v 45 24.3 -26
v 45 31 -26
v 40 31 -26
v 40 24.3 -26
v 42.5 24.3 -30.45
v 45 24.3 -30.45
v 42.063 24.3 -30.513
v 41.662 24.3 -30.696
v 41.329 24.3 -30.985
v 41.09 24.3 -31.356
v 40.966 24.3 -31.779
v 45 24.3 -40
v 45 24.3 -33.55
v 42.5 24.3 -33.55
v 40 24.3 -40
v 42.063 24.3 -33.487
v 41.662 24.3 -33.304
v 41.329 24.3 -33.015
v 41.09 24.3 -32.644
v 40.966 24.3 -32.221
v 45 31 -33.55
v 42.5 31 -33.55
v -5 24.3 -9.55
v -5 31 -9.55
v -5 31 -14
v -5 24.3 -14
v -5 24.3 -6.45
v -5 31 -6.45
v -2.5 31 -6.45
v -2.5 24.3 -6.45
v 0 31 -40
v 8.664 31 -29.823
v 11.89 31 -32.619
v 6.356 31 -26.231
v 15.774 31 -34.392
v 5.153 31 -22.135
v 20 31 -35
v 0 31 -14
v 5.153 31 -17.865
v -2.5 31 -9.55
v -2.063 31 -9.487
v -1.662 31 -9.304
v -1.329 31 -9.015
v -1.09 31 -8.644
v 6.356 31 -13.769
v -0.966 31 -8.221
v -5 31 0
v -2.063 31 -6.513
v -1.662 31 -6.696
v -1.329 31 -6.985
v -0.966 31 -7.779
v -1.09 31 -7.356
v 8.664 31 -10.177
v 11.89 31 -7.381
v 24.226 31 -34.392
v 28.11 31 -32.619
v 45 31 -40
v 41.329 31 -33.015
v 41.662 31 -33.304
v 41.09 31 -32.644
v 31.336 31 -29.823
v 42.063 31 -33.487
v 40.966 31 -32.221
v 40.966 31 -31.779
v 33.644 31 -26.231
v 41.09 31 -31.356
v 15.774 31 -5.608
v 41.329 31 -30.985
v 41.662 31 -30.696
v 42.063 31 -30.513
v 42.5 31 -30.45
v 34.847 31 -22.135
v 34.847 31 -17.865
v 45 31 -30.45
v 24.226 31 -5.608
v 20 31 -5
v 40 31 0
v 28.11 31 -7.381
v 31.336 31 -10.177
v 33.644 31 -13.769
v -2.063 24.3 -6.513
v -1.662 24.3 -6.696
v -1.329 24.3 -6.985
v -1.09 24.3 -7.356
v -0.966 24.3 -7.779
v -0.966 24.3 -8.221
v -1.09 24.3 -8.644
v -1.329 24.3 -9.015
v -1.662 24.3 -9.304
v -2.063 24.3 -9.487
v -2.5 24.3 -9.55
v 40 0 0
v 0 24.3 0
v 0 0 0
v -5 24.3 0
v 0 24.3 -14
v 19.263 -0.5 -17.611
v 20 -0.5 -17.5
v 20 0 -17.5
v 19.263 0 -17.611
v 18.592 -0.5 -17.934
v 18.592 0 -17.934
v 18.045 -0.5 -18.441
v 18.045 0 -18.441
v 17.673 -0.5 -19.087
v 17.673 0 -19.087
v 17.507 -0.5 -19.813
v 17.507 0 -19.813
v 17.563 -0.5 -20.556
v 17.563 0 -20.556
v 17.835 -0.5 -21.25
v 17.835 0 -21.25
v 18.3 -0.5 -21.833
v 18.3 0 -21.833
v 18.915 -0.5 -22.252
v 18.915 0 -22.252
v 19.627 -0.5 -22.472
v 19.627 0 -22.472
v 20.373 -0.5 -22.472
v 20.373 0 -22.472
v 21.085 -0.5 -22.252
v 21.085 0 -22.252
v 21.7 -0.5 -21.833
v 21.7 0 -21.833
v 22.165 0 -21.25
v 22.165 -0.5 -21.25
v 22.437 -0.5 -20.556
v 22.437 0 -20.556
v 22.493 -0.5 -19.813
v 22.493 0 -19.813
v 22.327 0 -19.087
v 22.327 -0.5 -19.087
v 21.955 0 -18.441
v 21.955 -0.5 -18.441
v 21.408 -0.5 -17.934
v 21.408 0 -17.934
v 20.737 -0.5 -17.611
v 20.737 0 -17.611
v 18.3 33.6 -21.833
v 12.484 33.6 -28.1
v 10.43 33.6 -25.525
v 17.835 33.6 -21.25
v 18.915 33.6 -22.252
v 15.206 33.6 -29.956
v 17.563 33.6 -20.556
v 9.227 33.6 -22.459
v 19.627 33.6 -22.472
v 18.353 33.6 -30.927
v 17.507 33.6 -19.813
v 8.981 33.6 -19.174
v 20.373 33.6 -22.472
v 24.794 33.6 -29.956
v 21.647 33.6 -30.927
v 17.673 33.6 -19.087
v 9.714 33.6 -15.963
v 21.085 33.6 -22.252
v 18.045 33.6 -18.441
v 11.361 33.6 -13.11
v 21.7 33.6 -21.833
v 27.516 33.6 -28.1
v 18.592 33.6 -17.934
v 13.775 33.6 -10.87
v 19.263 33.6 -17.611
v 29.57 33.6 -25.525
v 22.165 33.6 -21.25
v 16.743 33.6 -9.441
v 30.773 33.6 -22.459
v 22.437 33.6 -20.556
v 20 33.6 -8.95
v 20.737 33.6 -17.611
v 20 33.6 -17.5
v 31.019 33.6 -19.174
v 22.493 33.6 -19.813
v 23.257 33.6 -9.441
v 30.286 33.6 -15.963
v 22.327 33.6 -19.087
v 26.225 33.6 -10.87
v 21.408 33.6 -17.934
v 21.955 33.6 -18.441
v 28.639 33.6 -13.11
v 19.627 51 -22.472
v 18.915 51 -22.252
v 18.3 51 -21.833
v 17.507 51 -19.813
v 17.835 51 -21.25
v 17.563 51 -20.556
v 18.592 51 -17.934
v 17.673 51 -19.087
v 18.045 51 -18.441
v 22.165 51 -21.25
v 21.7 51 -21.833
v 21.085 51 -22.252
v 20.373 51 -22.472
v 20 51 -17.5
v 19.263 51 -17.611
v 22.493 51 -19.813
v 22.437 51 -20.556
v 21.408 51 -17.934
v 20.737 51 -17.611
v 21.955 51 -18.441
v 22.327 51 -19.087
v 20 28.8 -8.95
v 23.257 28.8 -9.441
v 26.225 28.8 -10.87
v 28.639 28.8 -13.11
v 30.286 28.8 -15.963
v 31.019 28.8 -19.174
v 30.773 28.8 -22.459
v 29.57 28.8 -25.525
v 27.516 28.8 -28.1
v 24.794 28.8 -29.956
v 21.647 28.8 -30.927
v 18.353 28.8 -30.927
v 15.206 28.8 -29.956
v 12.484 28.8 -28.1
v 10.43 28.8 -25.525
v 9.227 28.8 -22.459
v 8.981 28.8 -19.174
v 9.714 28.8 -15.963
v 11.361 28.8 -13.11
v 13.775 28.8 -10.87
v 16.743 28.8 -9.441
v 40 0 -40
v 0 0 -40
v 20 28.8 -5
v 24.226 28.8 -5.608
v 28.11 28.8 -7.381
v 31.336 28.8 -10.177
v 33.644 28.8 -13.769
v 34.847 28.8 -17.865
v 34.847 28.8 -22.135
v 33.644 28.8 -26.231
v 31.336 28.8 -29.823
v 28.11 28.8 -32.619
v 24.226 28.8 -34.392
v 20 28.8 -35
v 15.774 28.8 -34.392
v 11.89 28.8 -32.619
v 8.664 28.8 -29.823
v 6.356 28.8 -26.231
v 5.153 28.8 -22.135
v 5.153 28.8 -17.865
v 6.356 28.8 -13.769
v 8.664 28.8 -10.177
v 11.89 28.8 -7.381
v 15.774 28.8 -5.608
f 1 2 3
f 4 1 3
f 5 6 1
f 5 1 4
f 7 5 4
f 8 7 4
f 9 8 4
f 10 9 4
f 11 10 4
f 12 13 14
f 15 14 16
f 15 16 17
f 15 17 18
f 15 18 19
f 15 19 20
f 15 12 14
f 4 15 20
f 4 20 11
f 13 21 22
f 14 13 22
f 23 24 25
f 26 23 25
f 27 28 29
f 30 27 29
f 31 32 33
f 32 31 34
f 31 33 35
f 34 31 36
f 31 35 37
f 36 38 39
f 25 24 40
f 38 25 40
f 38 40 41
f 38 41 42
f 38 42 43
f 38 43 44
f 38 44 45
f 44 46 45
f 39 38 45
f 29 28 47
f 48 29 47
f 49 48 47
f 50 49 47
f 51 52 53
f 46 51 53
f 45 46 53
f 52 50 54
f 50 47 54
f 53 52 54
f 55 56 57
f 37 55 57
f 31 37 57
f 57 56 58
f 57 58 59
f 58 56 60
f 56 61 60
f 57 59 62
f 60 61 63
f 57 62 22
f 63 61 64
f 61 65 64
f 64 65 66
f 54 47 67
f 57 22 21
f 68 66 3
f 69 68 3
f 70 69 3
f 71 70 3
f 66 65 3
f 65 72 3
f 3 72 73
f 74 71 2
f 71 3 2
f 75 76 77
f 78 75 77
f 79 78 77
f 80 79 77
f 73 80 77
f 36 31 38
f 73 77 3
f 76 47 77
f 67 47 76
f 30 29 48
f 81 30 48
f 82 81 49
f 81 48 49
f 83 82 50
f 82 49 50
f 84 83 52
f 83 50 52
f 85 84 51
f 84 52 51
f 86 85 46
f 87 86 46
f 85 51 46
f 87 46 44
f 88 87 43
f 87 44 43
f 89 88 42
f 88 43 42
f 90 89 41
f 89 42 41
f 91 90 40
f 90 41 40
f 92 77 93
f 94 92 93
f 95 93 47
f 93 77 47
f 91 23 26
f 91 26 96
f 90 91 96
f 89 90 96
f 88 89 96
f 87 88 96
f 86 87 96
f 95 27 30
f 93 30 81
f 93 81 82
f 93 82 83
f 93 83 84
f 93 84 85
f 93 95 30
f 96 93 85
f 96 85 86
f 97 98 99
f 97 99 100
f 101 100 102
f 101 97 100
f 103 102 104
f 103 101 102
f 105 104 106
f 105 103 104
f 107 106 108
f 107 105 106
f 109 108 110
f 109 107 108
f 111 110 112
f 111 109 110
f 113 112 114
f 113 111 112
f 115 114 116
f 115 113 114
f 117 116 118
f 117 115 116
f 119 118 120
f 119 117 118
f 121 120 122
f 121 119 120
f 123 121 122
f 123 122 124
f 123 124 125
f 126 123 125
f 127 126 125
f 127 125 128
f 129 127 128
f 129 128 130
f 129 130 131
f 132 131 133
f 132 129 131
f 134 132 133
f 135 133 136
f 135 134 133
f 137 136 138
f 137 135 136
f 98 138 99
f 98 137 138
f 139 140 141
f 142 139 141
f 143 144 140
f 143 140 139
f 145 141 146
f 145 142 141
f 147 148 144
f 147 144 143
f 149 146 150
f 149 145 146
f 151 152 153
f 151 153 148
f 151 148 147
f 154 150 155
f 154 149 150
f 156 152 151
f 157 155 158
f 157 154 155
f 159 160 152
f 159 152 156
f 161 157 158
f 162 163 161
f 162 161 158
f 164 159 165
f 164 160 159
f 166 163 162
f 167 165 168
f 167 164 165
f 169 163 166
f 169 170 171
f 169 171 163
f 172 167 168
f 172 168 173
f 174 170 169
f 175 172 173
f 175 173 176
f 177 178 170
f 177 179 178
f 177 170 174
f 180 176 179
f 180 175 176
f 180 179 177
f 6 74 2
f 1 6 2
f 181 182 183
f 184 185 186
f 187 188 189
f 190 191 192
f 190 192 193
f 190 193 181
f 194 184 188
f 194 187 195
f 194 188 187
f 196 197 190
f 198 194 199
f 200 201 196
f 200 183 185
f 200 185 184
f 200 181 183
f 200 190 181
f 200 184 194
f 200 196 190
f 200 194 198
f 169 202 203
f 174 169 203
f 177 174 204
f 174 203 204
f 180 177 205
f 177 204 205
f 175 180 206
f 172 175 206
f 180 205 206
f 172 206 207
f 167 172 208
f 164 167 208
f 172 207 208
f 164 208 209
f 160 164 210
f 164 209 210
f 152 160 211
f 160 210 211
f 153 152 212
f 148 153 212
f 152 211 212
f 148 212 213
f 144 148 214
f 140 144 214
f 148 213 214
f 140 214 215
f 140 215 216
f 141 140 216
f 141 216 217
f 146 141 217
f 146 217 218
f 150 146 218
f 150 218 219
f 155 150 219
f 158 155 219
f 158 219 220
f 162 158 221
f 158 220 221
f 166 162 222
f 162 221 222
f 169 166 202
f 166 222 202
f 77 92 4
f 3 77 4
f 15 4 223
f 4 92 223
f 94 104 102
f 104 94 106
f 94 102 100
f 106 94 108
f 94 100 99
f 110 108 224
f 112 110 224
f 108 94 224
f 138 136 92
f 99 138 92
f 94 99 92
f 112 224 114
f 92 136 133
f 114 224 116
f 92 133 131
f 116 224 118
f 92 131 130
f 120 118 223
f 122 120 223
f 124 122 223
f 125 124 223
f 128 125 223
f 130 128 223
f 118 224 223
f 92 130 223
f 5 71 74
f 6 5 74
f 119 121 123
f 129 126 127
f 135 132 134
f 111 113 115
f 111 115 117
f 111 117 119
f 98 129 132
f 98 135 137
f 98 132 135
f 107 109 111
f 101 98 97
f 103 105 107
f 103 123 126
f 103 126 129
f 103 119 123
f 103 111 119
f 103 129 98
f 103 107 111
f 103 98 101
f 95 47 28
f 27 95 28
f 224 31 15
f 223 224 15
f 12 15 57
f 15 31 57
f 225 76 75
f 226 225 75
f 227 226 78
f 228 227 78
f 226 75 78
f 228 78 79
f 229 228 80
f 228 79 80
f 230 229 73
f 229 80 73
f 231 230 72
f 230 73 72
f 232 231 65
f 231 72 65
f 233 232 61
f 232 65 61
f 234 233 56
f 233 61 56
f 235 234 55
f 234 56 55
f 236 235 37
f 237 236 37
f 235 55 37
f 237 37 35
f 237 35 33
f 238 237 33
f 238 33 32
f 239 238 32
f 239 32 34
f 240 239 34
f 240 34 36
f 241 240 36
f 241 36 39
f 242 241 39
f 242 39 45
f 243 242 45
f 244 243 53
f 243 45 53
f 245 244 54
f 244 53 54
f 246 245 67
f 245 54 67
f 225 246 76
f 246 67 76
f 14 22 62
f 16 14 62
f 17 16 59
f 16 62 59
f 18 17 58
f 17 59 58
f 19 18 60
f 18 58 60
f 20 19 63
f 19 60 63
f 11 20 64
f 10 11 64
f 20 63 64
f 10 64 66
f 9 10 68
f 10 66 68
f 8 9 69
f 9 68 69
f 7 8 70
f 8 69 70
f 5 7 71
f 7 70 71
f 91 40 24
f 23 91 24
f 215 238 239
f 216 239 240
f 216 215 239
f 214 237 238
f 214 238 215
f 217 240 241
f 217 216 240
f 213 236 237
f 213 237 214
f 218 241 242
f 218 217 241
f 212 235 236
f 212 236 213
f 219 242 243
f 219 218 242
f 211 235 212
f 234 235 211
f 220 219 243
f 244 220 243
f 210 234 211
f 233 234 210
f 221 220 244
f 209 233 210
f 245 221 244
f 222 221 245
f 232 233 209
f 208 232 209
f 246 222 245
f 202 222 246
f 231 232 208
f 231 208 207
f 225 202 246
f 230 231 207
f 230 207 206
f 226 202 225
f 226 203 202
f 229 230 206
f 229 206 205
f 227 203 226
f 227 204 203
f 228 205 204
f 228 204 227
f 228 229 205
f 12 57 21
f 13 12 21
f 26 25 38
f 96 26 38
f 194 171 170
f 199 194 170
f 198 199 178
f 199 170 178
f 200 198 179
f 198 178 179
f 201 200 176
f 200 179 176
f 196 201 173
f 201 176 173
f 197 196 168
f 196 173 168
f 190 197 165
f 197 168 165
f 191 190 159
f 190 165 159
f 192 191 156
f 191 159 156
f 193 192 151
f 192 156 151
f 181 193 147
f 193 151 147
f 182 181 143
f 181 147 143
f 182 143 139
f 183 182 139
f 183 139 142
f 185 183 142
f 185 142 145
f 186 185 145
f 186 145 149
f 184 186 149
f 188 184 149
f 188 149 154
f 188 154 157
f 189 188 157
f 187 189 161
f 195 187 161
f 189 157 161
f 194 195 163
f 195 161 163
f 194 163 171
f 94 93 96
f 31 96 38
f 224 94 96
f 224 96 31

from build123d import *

# Parameters (mm, degrees)
SKETCH1_W           = 40
SKETCH1_H           = 40
BOSS_EXTRUDE1_DEPTH = 31
SKETCH2_R           = 15
CUT_EXTRUDE1_DEPTH  = 2.2
SKETCH3_R           = 11.05
BOSS_EXTRUDE2_DEPTH = 4.8
SKETCH4_R           = 2.5
BOSS_EXTRUDE3_DEPTH = 17.4
BOSS_EXTRUDE4_DEPTH = 6.7
CIRPATTERN1_COUNT   = 2
BOSS_EXTRUDE5_START = 0.5
SKETCH6_R           = 2.5
BOSS_EXTRUDE5_DEPTH = 0.5


with BuildPart() as part:
    # Sketch1 → Boss-Extrude1 (new body)
    with BuildSketch(Plane(origin=(0, 0, 0), x_dir=(1, 0, 0), z_dir=(0, 1, 0))):
        with Locations((20, 20)):
            Rectangle(SKETCH1_W, SKETCH1_H)
    extrude(amount=BOSS_EXTRUDE1_DEPTH)

    # Sketch2 → Cut-Extrude1 (cut)
    with BuildSketch(Plane(origin=(0, 31, 0), x_dir=(1, 0, 0), z_dir=(0, 1, 0))):
        with Locations((20, 20)):
            Circle(SKETCH2_R)
    extrude(amount=-CUT_EXTRUDE1_DEPTH, mode=Mode.SUBTRACT)

    # Sketch3 → Boss-Extrude2 (add)
    with BuildSketch(Plane(origin=(0, 28.8, 0), x_dir=(1, 0, 0), z_dir=(0, 1, 0))):
        with Locations((20, 20)):
            Circle(SKETCH3_R)
    extrude(amount=BOSS_EXTRUDE2_DEPTH)

    # Sketch4 → Boss-Extrude3 (add)
    with BuildSketch(Plane(origin=(0, 33.6, 0), x_dir=(1, 0, 0), z_dir=(0, 1, 0))):
        with Locations((20, 20)):
            Circle(SKETCH4_R)
    extrude(amount=BOSS_EXTRUDE3_DEPTH)

    # Sketch5 → Boss-Extrude4 (add)
    with BuildSketch(Plane(origin=(0, 31, 0), x_dir=(1, 0, 0), z_dir=(0, 1, 0))):
        with BuildLine():
            Line((40, 40), (45, 40))
            Line((45, 40), (45, 33.55))
            Line((45, 33.55), (42.5, 33.55))
            ThreePointArc((42.5, 33.55), (40.95, 32), (42.5, 30.45))
            Line((42.5, 30.45), (45, 30.45))
            Line((45, 30.45), (45, 26))
            Line((45, 26), (40, 26))
            Line((40, 26), (40, 40))
        make_face()
    boss_extrude4 = extrude(amount=-BOSS_EXTRUDE4_DEPTH)

    # CirPattern1: Boss-Extrude4 ×2 about axis
    cirpattern1_axis = Axis((20, 51, -20), (0, -1, 0))
    for i in range(1, CIRPATTERN1_COUNT):
        add(boss_extrude4.rotate(cirpattern1_axis, i * 360 / CIRPATTERN1_COUNT))

    # Sketch6 → Boss-Extrude5 (add)
    with BuildSketch(Plane.XZ.offset(BOSS_EXTRUDE5_START)):
        with Locations((20, -20)):
            Circle(SKETCH6_R)
    extrude(amount=-BOSS_EXTRUDE5_DEPTH)


solid = part.part
